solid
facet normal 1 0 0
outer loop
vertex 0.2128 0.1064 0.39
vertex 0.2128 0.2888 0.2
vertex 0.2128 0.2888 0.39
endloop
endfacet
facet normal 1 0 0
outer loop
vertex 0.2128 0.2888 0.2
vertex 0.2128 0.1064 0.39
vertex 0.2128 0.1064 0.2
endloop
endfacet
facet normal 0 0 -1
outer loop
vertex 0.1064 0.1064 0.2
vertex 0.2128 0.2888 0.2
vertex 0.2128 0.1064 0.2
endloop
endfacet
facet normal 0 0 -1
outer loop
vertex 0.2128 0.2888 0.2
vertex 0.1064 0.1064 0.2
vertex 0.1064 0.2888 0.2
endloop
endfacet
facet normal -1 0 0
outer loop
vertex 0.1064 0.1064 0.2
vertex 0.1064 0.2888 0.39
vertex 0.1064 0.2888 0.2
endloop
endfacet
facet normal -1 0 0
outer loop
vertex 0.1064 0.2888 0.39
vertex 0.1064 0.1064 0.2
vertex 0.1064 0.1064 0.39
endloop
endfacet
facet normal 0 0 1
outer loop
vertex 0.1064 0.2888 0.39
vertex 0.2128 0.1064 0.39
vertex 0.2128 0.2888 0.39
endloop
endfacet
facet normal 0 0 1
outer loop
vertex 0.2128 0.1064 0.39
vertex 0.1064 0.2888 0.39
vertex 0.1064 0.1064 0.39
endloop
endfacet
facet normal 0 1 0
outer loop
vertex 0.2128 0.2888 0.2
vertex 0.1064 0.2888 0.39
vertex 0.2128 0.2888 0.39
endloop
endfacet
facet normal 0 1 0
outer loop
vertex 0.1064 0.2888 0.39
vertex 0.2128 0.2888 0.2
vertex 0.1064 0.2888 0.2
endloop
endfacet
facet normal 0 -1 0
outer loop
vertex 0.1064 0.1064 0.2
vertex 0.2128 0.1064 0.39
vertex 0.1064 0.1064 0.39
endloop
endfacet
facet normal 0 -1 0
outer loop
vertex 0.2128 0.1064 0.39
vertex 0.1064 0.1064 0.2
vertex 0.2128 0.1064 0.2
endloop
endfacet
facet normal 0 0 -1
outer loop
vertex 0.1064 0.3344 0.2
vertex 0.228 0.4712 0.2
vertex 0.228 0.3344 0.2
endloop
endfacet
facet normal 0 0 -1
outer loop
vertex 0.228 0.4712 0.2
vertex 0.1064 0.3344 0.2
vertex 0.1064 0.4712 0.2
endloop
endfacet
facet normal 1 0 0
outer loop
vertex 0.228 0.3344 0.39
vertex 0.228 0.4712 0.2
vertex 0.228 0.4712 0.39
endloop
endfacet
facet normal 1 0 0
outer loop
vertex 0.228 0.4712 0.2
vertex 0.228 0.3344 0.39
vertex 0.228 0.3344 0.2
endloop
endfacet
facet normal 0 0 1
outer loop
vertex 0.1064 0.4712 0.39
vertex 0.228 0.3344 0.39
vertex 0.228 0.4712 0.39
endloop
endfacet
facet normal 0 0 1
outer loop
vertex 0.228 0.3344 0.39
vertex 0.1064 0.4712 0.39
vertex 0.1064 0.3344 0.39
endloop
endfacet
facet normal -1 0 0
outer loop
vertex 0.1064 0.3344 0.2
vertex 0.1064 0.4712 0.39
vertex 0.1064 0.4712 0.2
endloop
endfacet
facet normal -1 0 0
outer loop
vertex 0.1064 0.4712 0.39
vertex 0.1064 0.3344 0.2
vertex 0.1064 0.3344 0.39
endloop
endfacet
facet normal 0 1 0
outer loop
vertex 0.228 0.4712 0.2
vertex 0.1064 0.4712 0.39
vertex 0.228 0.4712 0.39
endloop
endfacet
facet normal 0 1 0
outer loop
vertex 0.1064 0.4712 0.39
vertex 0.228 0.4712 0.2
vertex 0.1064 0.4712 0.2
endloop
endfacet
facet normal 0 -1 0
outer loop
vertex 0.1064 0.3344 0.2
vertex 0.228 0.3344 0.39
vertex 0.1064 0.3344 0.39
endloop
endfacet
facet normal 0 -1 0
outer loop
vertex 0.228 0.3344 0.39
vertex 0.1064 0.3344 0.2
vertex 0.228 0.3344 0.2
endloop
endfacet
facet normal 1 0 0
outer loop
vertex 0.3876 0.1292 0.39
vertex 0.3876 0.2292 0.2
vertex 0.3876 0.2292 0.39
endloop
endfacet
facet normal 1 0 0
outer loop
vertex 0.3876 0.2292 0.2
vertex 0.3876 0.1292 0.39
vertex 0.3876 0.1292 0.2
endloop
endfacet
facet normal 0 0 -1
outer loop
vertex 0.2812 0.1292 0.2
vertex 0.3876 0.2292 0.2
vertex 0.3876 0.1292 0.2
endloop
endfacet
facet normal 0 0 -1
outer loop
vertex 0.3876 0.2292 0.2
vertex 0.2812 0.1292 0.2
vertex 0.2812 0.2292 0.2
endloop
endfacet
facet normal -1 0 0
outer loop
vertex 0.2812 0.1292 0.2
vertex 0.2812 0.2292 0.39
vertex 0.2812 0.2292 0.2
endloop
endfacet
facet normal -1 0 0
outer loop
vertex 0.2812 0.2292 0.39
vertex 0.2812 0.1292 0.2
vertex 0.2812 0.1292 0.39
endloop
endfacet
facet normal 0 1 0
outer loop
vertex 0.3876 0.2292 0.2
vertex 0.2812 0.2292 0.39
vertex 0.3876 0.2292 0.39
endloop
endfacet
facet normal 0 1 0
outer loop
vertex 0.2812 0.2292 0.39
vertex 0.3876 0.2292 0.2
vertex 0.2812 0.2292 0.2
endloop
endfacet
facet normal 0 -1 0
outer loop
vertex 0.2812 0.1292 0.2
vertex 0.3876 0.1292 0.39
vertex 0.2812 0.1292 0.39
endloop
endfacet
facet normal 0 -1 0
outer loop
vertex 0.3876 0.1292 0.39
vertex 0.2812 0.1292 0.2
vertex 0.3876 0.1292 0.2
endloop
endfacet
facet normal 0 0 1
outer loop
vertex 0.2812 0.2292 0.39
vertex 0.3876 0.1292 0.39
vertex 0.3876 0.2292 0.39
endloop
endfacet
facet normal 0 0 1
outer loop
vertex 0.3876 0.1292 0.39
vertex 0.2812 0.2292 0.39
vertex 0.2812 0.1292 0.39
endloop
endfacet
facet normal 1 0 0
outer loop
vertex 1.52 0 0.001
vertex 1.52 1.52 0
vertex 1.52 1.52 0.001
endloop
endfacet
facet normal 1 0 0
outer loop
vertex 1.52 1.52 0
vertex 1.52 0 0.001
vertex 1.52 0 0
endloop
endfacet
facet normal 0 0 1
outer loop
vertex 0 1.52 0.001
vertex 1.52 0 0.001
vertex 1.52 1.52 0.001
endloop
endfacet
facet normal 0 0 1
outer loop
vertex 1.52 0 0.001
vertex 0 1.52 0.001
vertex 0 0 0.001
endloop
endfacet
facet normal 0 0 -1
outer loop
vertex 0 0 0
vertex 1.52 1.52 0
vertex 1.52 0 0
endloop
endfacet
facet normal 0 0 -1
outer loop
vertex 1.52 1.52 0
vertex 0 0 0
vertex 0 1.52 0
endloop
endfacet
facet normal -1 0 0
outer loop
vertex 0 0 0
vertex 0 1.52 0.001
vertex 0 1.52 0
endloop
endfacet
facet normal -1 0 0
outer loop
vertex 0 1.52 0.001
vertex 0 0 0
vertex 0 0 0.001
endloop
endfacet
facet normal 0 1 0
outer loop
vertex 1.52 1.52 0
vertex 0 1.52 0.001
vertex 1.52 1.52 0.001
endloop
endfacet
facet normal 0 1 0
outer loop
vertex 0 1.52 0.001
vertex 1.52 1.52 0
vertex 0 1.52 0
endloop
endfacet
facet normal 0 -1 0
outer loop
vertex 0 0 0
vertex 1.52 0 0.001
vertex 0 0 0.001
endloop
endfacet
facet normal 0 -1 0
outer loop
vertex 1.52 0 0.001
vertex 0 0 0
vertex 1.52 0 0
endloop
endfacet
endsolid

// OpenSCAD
// file: lef_scad_config.scad
// configuration

layers = [
"met1",
"met2",
"met3",
"met4",
"met5",
"met6",
"met7",
"met8",
"met9"
] ;

platform_config = [
["lpv",   20],
["px",    7.6e-3],
["layer", 10e-3],
["pitch", 30],
["via_w", 14],
["bottom_layers", 20],
["chan_def", [14, 10]]
] ;

io_loc_layer = [
  [[960, 660, "met9"],[1050, 660, "met9"],[1140, 660, "met9"],[1230, 660, "met9"],[1320, 660, "met9"],
  [1410, 660, "met9"],[1500, 660, "met9"],[1590, 660, "met9"]
  ],
  [[960, 750, "met9"],[1050, 750, "met9"],[1140, 750, "met9"],[1230, 750, "met9"],[1320, 750, "met9"],
  [1410, 750, "met9"],[1500, 750, "met9"],[1590, 750, "met9"]
  ],
  [[960, 840, "met9"],[1050, 840, "met9"],[1140, 840, "met9"],[1230, 840, "met9"],[1320, 840, "met9"],
  [1410, 840, "met9"],[1500, 840, "met9"],[1590, 840, "met9"]
  ],
  [[960, 930, "met9"],[1050, 930, "met9"],[1140, 930, "met9"],[1230, 930, "met9"],[1320, 930, "met9"],
  [1410, 930, "met9"],[1500, 930, "met9"],[1590, 930, "met9"]
  ]
] ;
// main file
include <lef_scad_config.scad>

ren_th = 0.1 ;

port_clr1 = "red" ;
port_clr2 = "blue" ;

module lef_obs(geometry, pts, px=undef, layer=undef, lpv=undef, chan_def=undef)
{
    px = !px ? get_config("px") : px;
    lpv = !lpv ? get_config("lpv") : lpv;
    layer = !layer ? get_config("layer") : layer;
    chan_def = !chan_def ? get_config("chan_def") : chan_def;

    assert(geometry=="RECT" || geometry=="rect");

    %lef_rect(pts*px, layer*lpv, px, layer, lpv, layer, chan_def) ;
}

module lef_port(port_name="", direction="", geometry="", pts=false, center=true, px=undef, layer_h=undef, layer=undef, lpv=undef, chan_def=undef)
{
    px = !px ? get_config("px") : px;
    lpv = !lpv ? get_config("lpv") : lpv;
    layer = !layer ? get_config("layer") : layer;
    chan_def = !chan_def ? get_config("chan_def") : chan_def;
    layer_h = !layer_h ? chan_def[1] : layer_h;

    assert(geometry=="RECT" || geometry=="rect");

    port_center = (
      len(pts)==4 ? [
        (pts[0]+pts[2])/2,
        (pts[1]+pts[3])/2,
        (pts[0]+pts[2])/2,
        (pts[1]+pts[3])/2
      ] : (len(pts)==2 ?
        (!is_num(pts[0]) ?
          [
            (pts[0][0]+pts[1][0])/2,
            (pts[0][1]+pts[1][1])/2,
            (pts[0][0]+pts[1][0])/2,
            (pts[0][1]+pts[1][1])/2,
          ] :
          (center ?
           pts : pts - chan_def/2))
      : [])
      ) ;


    chan_centered = (
      len(pts) == 4 ? [
          -chan_def[0]/2,
          -chan_def[0]/2,
          chan_def[0]/2,
          chan_def[0]/2,
      ] :
        (!is_num(pts) == 2 ? [
            -chan_def[0]/2,
            -chan_def[0]/2,
            chan_def[0]/2,
            chan_def[0]/2,
          ] :
          [
            chan_def[0],
            chan_def[0]
          ]
          )
    );

    if(len(pts)==4){
      color(port_clr1)
      lef_rect(
          (port_center + chan_centered )*px,
          layer_h*layer,
          px=px, layer=layer, lpv=lpv, chan_def=chan_def
          ) ;
      color(port_clr2, 0.6)
            lef_rect(
            pts*px,
            layer * (lpv-1),
            px=px, layer=layer, lpv=lpv, chan_def=chan_def
          ) ;
    } else if(len(pts)==2)
    {
      if(is_num(pts[0])){
        color(port_clr1)
        lef_rect(
            pts*px,
            layer_h*layer, // get channel height
            center=center,
    px=px, layer=layer, lpv=lpv, chan_def=chan_def
            ) ;
        color(port_clr2, 0.6)
        lef_rect(
            (pts*px),
            layer*(lpv-1),
            center=center,
            px=px, layer=layer, lpv=lpv, chan_def=chan_def
          ) ;
      } else {
        color(port_clr1)
        lef_rect(
            (port_center + chan_centered)*px,
            layer_h*layer, // get channel height
            center=center,
            px=px, layer=layer, lpv=lpv, chan_def=chan_def
          ) ;
        color(port_clr2, 0.6)
    lef_rect(
        [pts[0],pts[1],
        pts[0]+via_w,
        pts[1]+via_w]*px,
            layer_h*(lpv-1),
            center=center,
            px=px, layer=layer, lpv=lpv, chan_def=chan_def
          ) ;
      }
    }
}

module lef_rect(pts, th=ren_th, center=true, px=undef, lpv=undef, layer=undef, chan_def=undef)
{
    px = !px ? get_config("px") : px;
    lpv = !lpv ? get_config("lpv") : lpv;
    layer = !layer ? get_config("layer") : layer;
    chan_def = !chan_def ? get_config("chan_def") : chan_def;

    w  = (len(pts)==2 ?
          (!is_num(pts[0]) ? abs(pts[0][0] - pts[1][0]):
            chan_def[0]*px):
        (len(pts)==4?abs(pts[0] - pts[2]):0));
    h  = (len(pts)==2 ?
          (!is_num(pts[0]) ? abs(pts[0][1] - pts[1][1]):
            chan_def[1]*layer):
        (len(pts)==4?abs(pts[1] - pts[3]):0));
    ox = (len(pts)==2 ?
          (!is_num(pts[0]) ? abs(pts[0][0]):
            (center ? pts[0]-chan_def[0]/2*px:pts[0])):
        (len(pts)==4?abs(pts[0]):0));
    oy = (len(pts)==2 ?
          (!is_num(pts[0]) ? abs(pts[0][1]):
            (center ? pts[1]-chan_def[0]/2*px:pts[0])):
        (len(pts)==4?abs(pts[1]):0));

    translate([ox, oy, 0])
        cube([w, h, th]) ;
}
module lef_layer_index(layer_index, px=undef, layer=undef, lpv=undef, chan_def=undef)
{
    px = !px ? get_config("px") : px;
    lpv = !lpv ? get_config("lpv") : lpv;
    layer = !layer ? get_config("layer") : layer;
    chan_def = !chan_def ? get_config("chan_def") : chan_def;
    l_off = layer * lpv * layer_index;

    translate([0,0,l_off])
        children() ;
}

module lef_layer(layer_name, px=undef, layer=undef, lpv=undef, chan_def=undef)
{
    layer_index = get_layer_index(layer_name);
    lef_layer_index(layer_index, px, layer, lpv, chan_def)
    children();
}

module lef_size(X, Y, px=undef, layer=undef, lpv=undef, chan_def=undef)
{
    px = !px ? get_config("px") : px;
    lpv = !lpv ? get_config("lpv") : lpv;
    layer = !layer ? get_config("layer") : layer;
    chan_def = !chan_def ? get_config("chan_def") : chan_def;

    cube([X*px, Y*px, layer*0.1]);
}

function get_layer_index(x) = search([x], layers)[0] ;

function get_config(prop) = platform_config[search([prop], platform_config)[0]][1] ;

function get_io_layer(x1, x2) = io_loc_layer[x1][x2] ;


lef_size(200, 200) ;

lef_layer("met1")
    lef_obs("RECT", [0,0,100,120]) ;
lef_layer("met2")
    lef_obs("RECT", [0,0,100,120]) ;

lef_layer("met2")
    lef_port("", "", "RECT", [14,14,28,38]) ;

lef_layer_index(get_layer_index("met2"))
    lef_port("", "", "RECT", [14,44,30,62]) ;

lef_layer_index(get_layer_index("met2"))
    lef_port("", "", "RECT", [44,24]) ;
